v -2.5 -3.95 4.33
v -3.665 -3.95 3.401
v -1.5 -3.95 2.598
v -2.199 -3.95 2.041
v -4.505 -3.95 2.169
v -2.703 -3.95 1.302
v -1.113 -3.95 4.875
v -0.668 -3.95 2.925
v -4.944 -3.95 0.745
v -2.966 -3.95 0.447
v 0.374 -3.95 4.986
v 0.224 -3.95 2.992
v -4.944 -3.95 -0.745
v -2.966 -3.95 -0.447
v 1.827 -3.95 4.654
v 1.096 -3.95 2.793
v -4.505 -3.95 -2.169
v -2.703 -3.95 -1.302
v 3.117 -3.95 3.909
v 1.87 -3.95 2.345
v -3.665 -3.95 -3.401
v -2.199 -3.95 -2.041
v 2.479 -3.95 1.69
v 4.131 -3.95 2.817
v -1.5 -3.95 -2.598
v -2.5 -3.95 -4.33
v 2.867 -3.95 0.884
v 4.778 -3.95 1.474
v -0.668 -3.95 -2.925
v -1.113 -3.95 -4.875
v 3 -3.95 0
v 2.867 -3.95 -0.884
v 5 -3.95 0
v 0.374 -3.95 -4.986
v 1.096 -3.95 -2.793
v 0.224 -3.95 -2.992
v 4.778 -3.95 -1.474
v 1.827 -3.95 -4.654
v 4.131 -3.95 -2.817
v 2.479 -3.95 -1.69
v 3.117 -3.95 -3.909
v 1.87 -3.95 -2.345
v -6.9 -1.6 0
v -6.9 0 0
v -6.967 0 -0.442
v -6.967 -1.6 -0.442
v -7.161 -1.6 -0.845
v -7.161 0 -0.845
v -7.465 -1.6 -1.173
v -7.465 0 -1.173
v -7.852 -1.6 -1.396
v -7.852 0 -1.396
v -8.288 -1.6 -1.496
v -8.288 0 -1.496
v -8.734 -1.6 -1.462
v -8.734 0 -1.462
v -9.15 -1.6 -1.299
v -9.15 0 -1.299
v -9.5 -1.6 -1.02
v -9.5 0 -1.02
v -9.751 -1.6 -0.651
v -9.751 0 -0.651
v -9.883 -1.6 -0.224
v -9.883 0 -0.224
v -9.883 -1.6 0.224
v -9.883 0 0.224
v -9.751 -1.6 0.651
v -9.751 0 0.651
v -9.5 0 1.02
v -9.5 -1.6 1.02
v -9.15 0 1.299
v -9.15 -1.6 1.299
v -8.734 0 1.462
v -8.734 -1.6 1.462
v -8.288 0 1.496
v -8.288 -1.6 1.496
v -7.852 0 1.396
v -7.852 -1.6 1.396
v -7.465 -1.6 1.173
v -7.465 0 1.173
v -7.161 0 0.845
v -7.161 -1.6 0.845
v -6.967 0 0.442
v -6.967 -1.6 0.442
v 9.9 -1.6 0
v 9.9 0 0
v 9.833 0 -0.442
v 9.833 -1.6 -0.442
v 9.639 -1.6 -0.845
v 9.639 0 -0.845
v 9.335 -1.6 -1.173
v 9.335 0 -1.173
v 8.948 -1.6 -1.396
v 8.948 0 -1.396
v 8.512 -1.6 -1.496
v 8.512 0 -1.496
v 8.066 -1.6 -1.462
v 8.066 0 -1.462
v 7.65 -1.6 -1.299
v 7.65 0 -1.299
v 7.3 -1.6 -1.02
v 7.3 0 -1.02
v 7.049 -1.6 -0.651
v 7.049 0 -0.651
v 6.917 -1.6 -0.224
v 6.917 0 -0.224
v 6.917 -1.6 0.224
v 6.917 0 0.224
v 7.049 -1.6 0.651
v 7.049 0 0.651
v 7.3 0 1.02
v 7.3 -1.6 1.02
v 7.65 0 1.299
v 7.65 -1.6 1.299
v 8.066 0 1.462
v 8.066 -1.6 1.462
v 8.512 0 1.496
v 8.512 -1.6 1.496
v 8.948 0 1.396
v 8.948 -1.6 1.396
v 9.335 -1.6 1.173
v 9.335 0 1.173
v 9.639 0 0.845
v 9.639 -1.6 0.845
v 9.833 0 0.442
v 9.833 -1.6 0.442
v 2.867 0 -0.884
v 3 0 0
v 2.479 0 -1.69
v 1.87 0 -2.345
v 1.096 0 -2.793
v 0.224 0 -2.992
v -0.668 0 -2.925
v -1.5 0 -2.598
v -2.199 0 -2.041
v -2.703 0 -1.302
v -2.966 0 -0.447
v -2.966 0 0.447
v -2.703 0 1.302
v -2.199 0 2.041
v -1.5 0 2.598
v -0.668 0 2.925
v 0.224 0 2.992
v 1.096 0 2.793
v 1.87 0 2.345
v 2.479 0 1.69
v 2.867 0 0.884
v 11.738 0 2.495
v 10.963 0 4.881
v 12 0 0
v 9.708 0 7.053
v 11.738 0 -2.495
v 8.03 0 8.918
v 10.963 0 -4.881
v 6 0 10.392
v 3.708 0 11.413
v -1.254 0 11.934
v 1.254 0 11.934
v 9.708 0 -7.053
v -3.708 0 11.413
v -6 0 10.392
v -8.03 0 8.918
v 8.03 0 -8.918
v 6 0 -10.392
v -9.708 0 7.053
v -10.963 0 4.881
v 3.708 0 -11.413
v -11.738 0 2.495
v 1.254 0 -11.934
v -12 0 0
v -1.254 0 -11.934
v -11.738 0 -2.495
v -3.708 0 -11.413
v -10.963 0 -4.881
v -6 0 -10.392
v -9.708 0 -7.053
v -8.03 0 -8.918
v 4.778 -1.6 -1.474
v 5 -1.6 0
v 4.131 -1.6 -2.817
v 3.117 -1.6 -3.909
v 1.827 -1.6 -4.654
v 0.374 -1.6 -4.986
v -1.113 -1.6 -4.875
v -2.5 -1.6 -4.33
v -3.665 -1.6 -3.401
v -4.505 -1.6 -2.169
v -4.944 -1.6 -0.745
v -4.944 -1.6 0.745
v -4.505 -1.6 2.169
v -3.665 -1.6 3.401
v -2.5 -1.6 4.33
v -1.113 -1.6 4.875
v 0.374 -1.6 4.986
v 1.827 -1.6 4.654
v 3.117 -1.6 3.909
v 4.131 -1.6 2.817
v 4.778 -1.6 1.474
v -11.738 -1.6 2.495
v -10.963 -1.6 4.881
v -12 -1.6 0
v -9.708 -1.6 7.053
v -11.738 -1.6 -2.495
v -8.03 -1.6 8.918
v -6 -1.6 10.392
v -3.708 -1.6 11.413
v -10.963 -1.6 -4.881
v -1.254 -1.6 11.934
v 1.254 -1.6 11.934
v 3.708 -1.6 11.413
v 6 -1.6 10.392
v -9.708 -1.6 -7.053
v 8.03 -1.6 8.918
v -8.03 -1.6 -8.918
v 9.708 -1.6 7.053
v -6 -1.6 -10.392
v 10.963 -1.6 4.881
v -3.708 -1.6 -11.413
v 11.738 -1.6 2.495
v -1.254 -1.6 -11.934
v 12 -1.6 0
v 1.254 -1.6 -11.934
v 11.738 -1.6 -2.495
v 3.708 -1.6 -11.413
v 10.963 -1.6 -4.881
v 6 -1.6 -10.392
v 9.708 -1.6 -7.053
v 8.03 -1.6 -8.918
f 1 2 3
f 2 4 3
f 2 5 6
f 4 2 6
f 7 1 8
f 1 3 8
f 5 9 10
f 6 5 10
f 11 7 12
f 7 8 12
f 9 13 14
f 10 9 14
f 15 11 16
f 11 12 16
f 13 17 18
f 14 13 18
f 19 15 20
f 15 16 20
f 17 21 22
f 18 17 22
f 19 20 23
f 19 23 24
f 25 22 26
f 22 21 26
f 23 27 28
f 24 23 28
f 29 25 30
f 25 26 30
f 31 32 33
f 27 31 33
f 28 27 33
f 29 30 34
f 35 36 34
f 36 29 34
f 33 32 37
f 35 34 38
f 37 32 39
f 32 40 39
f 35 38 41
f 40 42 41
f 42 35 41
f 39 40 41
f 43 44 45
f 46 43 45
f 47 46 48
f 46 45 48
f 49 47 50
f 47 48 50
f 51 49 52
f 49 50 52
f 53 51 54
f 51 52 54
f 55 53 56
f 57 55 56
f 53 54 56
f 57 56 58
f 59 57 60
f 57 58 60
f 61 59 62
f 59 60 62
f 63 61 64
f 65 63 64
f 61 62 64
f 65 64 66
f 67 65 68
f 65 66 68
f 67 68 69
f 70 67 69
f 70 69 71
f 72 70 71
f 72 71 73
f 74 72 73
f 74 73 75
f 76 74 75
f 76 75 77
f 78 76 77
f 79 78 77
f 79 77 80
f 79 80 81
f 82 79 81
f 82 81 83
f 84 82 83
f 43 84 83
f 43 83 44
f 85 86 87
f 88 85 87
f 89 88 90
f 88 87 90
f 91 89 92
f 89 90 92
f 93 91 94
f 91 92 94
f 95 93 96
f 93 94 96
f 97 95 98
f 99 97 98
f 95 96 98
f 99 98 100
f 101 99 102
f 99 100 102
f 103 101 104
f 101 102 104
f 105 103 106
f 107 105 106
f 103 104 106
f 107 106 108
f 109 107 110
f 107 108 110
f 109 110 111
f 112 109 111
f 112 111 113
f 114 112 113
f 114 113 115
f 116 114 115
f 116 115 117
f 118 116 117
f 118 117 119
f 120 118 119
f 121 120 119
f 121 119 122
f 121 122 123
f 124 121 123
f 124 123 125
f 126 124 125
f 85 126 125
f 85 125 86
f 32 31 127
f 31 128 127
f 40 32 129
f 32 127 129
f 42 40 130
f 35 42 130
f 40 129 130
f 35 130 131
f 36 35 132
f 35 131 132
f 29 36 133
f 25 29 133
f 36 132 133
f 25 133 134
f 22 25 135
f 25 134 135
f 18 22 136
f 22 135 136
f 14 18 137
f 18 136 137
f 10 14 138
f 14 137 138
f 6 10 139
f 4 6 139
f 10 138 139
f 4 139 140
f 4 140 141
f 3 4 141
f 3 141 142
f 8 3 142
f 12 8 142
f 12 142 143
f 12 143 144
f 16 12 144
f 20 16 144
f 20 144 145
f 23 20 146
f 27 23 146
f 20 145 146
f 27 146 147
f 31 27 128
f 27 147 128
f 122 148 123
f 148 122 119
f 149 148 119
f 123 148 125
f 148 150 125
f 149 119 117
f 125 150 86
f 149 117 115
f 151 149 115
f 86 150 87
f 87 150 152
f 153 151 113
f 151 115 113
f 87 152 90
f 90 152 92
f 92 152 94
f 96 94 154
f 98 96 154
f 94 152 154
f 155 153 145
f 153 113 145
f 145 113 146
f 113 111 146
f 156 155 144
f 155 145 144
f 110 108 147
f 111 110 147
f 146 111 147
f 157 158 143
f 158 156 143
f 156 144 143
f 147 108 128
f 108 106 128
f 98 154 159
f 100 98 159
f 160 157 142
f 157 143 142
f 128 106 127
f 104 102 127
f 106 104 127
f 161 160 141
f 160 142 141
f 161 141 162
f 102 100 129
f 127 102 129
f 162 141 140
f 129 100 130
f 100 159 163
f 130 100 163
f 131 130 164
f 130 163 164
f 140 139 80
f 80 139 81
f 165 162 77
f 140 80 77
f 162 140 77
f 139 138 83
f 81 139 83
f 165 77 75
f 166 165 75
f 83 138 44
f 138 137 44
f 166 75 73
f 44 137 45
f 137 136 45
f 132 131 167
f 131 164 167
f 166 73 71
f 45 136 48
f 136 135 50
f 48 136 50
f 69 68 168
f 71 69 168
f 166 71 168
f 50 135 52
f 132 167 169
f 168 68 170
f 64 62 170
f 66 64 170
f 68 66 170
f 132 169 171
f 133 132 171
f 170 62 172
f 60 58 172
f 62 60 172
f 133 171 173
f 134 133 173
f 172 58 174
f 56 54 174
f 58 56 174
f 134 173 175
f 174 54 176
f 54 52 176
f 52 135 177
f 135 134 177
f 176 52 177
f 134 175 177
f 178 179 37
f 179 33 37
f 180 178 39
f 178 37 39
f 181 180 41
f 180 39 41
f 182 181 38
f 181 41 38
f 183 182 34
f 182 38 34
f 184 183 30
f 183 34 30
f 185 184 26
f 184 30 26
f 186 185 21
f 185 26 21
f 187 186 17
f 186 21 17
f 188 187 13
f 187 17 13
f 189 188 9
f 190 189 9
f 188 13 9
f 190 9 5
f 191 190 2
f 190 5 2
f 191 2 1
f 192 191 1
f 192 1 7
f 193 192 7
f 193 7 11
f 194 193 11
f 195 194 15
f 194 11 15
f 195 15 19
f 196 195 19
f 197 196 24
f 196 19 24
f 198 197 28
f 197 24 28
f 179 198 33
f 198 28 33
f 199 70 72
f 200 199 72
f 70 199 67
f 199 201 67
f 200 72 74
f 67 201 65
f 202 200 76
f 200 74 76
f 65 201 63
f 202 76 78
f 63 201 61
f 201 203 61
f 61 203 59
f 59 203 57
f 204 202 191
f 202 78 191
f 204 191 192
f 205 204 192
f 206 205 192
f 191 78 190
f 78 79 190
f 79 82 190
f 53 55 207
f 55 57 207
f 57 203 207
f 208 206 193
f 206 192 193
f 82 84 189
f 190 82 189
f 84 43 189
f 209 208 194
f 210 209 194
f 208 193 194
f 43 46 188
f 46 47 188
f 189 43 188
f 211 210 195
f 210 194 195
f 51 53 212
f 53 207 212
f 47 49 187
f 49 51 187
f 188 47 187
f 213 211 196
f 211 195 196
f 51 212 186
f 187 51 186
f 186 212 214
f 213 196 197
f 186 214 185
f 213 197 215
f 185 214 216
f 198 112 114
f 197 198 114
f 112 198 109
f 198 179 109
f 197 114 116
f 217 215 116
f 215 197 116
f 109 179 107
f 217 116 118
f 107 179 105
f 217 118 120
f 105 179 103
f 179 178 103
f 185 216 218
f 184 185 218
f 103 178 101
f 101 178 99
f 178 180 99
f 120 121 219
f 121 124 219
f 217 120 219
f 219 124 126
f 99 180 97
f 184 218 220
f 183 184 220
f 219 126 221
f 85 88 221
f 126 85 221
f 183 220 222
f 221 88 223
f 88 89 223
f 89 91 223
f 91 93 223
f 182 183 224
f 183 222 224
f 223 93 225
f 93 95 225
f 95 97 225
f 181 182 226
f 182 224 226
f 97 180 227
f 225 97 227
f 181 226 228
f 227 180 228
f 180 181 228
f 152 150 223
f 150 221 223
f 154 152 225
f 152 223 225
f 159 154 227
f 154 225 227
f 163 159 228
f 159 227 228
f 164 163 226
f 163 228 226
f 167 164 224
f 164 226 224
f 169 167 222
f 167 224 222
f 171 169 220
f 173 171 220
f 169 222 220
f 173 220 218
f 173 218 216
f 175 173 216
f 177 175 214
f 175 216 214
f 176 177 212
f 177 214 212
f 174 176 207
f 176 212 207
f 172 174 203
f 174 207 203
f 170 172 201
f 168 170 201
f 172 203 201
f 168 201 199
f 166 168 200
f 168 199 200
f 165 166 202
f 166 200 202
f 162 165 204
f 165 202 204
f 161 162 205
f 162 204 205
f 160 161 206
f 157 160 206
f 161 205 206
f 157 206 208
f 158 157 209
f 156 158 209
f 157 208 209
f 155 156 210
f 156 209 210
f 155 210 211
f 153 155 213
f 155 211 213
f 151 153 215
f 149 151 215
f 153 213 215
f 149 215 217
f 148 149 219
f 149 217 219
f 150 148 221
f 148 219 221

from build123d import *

# Parameters (mm, degrees)
SKETCH2_R          = 1.5
CUT_EXTRUDE1_DEPTH = 4.95


with BuildPart() as part:
    # Sketch1 → Revolve1 (revolve)
    with BuildSketch(Plane.XY):
        Polygon((12, 0), (12, -1.6), (5, -1.6), (5, -3.95), (3, -3.95), (3, 0), align=None)
    revolve(axis=Axis((0, 0, 0), (0, 1, 0)))

    # Sketch2 → Cut-Extrude1 (cut, through all)
    with BuildSketch(Plane(origin=(0, 0, 0), x_dir=(1, 0, 0), z_dir=(0, 1, 0))):
        with Locations((8.4, 0)):
            Circle(SKETCH2_R)
        with Locations((-8.4, 0)):
            Circle(SKETCH2_R)
    extrude(amount=-CUT_EXTRUDE1_DEPTH, mode=Mode.SUBTRACT)


solid = part.part
